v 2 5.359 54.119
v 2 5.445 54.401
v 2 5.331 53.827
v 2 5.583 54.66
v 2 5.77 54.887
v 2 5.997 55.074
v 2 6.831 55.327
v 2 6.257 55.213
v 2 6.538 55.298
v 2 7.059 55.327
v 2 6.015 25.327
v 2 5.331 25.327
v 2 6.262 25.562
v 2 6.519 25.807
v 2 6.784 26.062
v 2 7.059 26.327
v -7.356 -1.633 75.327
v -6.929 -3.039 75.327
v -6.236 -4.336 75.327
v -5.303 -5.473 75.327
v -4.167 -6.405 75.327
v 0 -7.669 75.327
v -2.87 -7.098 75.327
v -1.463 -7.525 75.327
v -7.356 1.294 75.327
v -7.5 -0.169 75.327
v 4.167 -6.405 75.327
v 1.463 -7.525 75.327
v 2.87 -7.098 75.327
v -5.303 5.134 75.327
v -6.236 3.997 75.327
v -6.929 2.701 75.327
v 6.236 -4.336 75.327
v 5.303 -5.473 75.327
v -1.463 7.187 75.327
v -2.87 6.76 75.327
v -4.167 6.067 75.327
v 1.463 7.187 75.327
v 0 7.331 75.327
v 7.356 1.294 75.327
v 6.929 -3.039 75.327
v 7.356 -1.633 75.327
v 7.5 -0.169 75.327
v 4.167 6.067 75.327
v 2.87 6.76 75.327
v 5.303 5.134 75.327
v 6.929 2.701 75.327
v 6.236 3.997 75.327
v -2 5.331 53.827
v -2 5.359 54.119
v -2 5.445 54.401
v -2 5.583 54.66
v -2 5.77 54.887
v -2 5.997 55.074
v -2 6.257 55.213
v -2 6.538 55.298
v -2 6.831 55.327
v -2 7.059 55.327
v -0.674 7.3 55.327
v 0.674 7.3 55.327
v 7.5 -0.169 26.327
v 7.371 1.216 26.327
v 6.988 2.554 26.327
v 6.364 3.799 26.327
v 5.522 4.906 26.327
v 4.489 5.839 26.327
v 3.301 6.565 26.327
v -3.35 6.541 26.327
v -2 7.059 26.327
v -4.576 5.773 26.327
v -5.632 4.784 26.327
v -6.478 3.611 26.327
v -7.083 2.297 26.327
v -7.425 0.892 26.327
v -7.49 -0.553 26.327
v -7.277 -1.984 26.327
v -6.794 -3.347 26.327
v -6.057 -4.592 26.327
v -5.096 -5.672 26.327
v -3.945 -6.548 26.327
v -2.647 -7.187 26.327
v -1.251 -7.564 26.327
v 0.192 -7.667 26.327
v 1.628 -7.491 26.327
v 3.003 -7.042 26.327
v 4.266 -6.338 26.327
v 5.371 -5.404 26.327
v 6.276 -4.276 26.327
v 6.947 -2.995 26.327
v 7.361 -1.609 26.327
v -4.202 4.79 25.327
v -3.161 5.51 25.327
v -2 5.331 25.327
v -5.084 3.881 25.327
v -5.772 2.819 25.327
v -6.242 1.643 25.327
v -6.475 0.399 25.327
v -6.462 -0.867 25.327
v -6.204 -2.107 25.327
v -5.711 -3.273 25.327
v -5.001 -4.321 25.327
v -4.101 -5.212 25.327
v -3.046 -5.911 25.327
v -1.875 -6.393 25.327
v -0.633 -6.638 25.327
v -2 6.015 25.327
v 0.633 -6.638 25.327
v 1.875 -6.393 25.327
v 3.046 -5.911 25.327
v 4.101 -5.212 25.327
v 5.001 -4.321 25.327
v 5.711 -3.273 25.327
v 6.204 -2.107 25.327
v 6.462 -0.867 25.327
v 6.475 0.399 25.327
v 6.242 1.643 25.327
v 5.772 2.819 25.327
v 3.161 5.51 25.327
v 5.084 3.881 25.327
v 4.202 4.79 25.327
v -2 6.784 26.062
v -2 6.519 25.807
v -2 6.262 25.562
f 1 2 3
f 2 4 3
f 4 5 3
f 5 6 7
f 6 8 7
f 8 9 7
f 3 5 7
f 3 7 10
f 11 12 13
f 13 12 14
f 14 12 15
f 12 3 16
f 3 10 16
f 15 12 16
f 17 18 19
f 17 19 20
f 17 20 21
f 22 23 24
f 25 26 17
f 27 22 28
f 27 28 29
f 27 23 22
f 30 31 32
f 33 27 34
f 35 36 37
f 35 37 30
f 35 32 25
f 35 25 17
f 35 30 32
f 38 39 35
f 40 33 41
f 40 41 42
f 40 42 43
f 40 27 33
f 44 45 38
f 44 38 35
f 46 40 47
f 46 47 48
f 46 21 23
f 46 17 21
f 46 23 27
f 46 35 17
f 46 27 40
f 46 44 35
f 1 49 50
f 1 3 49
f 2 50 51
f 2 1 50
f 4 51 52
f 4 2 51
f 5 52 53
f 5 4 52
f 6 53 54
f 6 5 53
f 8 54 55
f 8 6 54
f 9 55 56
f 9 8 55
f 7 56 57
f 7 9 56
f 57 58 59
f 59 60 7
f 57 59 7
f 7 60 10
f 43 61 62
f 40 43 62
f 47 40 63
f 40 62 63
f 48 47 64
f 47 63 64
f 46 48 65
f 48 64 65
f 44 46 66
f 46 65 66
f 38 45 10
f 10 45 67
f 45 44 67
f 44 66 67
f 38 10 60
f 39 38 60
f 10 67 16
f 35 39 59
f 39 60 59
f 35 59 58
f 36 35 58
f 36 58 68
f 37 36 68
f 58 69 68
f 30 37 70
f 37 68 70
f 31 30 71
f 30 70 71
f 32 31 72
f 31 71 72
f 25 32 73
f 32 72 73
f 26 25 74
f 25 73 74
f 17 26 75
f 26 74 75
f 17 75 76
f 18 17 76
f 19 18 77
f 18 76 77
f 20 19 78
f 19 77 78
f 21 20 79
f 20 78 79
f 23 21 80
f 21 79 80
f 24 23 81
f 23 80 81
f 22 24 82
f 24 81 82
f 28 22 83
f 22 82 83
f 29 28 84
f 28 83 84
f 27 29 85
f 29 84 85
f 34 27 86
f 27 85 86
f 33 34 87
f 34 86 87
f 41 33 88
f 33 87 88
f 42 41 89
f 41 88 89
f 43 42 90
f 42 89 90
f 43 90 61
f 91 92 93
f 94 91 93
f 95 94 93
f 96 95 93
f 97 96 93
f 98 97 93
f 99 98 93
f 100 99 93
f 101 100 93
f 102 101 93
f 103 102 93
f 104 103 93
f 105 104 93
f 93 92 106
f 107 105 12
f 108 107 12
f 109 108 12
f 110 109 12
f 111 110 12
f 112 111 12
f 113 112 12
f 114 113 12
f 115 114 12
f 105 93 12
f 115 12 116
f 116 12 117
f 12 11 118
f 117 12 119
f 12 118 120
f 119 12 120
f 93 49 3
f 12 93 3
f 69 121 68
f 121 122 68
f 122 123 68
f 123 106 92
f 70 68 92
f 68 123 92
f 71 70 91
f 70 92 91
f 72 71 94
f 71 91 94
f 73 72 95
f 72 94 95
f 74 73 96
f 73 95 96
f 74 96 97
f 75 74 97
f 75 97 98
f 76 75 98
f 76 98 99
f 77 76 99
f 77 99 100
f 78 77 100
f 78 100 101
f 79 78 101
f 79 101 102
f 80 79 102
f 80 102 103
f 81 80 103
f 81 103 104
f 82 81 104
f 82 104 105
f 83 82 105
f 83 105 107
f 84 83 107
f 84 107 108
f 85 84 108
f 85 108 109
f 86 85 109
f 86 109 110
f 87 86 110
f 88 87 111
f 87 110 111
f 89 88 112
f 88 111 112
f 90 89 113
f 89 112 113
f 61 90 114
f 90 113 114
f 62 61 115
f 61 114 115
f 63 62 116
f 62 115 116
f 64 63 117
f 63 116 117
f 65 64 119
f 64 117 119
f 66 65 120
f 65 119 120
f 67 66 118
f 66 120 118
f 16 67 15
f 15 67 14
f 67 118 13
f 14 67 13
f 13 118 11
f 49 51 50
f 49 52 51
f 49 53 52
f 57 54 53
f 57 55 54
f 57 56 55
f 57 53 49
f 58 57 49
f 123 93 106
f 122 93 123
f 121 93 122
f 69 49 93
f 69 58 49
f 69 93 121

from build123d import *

# Parameters (mm, degrees)
SKETCH1_R           = 15
BOSS_EXTRUDE1_DEPTH = 100
CHAMFER1_SIZE       = 2
SKETCH3_W           = 8
SKETCH3_H           = 60
CUT_EXTRUDE1_DEPTH  = 4
FILLET1_R           = 3
ESCALA1_SCALE       = 0.5


with BuildPart() as part:
    # Sketch1 → Boss-Extrude1 (new body)
    with BuildSketch(Plane.XY):
        Circle(SKETCH1_R)
    extrude(amount=BOSS_EXTRUDE1_DEPTH)

    # Chamfer1
    chamfer1_edges = [part.edges().sort_by_distance(p)[0] for p in [
        (-15, 0, 0),
    ]]
    chamfer(chamfer1_edges, length=CHAMFER1_SIZE)

    # Sketch3 → Cut-Extrude1 (cut)
    with BuildSketch(Plane(origin=(0, 15, 100), x_dir=(1, 0, 0), z_dir=(0, 1, 0))):
        with Locations((0, 70)):
            Rectangle(SKETCH3_W, SKETCH3_H)
    extrude(amount=-CUT_EXTRUDE1_DEPTH, mode=Mode.SUBTRACT)

    # Fillet1
    fillet1_edges = [part.edges().sort_by_distance(p)[0] for p in [
        (0, 11, 60),
    ]]
    fillet(fillet1_edges, radius=FILLET1_R)


with BuildPart() as part_1:
    # Escala1: scaled about (0, -0.338706131, 50.653578584)
    add(part.part.scale(ESCALA1_SCALE).moved(Location((0, -0.169353066, 25.326789292))))


solid = part_1.part
